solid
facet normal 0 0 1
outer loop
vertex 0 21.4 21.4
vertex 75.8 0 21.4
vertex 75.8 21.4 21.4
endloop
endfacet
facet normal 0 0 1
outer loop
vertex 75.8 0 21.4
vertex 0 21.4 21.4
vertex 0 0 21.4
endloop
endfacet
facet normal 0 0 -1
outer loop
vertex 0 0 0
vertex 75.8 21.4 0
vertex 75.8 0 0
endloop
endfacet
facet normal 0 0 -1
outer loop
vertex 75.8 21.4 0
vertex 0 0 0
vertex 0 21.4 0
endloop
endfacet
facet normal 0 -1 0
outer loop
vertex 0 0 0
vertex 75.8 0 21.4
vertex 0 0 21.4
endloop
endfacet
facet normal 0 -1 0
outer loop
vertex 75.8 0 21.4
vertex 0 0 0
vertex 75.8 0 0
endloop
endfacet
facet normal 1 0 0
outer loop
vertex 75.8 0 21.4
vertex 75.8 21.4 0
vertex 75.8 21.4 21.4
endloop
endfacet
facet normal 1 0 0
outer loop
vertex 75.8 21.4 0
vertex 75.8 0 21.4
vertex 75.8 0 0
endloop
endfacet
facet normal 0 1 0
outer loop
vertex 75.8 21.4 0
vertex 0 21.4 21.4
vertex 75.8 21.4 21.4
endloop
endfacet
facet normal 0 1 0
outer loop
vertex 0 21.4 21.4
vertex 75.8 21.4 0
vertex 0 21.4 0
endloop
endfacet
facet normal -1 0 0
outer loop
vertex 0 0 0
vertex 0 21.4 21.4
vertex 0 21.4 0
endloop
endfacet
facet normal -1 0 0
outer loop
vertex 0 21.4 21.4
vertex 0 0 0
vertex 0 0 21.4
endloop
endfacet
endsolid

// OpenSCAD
// file: configurations.scad
Battery_x_size = 75.8;
Battery_y_size = 21.4;
Battery_z_size = 21.4;
// main file
include <configurations.scad>

/**
 * battery
 * @name battery
 * @description battery
 * @type component
 * @parent root
 */
module battery(
    center = false,
) {
    color("red")
    cube([
        Battery_x_size,
        Battery_y_size,
        Battery_z_size
    ], center = center);
}

battery();
